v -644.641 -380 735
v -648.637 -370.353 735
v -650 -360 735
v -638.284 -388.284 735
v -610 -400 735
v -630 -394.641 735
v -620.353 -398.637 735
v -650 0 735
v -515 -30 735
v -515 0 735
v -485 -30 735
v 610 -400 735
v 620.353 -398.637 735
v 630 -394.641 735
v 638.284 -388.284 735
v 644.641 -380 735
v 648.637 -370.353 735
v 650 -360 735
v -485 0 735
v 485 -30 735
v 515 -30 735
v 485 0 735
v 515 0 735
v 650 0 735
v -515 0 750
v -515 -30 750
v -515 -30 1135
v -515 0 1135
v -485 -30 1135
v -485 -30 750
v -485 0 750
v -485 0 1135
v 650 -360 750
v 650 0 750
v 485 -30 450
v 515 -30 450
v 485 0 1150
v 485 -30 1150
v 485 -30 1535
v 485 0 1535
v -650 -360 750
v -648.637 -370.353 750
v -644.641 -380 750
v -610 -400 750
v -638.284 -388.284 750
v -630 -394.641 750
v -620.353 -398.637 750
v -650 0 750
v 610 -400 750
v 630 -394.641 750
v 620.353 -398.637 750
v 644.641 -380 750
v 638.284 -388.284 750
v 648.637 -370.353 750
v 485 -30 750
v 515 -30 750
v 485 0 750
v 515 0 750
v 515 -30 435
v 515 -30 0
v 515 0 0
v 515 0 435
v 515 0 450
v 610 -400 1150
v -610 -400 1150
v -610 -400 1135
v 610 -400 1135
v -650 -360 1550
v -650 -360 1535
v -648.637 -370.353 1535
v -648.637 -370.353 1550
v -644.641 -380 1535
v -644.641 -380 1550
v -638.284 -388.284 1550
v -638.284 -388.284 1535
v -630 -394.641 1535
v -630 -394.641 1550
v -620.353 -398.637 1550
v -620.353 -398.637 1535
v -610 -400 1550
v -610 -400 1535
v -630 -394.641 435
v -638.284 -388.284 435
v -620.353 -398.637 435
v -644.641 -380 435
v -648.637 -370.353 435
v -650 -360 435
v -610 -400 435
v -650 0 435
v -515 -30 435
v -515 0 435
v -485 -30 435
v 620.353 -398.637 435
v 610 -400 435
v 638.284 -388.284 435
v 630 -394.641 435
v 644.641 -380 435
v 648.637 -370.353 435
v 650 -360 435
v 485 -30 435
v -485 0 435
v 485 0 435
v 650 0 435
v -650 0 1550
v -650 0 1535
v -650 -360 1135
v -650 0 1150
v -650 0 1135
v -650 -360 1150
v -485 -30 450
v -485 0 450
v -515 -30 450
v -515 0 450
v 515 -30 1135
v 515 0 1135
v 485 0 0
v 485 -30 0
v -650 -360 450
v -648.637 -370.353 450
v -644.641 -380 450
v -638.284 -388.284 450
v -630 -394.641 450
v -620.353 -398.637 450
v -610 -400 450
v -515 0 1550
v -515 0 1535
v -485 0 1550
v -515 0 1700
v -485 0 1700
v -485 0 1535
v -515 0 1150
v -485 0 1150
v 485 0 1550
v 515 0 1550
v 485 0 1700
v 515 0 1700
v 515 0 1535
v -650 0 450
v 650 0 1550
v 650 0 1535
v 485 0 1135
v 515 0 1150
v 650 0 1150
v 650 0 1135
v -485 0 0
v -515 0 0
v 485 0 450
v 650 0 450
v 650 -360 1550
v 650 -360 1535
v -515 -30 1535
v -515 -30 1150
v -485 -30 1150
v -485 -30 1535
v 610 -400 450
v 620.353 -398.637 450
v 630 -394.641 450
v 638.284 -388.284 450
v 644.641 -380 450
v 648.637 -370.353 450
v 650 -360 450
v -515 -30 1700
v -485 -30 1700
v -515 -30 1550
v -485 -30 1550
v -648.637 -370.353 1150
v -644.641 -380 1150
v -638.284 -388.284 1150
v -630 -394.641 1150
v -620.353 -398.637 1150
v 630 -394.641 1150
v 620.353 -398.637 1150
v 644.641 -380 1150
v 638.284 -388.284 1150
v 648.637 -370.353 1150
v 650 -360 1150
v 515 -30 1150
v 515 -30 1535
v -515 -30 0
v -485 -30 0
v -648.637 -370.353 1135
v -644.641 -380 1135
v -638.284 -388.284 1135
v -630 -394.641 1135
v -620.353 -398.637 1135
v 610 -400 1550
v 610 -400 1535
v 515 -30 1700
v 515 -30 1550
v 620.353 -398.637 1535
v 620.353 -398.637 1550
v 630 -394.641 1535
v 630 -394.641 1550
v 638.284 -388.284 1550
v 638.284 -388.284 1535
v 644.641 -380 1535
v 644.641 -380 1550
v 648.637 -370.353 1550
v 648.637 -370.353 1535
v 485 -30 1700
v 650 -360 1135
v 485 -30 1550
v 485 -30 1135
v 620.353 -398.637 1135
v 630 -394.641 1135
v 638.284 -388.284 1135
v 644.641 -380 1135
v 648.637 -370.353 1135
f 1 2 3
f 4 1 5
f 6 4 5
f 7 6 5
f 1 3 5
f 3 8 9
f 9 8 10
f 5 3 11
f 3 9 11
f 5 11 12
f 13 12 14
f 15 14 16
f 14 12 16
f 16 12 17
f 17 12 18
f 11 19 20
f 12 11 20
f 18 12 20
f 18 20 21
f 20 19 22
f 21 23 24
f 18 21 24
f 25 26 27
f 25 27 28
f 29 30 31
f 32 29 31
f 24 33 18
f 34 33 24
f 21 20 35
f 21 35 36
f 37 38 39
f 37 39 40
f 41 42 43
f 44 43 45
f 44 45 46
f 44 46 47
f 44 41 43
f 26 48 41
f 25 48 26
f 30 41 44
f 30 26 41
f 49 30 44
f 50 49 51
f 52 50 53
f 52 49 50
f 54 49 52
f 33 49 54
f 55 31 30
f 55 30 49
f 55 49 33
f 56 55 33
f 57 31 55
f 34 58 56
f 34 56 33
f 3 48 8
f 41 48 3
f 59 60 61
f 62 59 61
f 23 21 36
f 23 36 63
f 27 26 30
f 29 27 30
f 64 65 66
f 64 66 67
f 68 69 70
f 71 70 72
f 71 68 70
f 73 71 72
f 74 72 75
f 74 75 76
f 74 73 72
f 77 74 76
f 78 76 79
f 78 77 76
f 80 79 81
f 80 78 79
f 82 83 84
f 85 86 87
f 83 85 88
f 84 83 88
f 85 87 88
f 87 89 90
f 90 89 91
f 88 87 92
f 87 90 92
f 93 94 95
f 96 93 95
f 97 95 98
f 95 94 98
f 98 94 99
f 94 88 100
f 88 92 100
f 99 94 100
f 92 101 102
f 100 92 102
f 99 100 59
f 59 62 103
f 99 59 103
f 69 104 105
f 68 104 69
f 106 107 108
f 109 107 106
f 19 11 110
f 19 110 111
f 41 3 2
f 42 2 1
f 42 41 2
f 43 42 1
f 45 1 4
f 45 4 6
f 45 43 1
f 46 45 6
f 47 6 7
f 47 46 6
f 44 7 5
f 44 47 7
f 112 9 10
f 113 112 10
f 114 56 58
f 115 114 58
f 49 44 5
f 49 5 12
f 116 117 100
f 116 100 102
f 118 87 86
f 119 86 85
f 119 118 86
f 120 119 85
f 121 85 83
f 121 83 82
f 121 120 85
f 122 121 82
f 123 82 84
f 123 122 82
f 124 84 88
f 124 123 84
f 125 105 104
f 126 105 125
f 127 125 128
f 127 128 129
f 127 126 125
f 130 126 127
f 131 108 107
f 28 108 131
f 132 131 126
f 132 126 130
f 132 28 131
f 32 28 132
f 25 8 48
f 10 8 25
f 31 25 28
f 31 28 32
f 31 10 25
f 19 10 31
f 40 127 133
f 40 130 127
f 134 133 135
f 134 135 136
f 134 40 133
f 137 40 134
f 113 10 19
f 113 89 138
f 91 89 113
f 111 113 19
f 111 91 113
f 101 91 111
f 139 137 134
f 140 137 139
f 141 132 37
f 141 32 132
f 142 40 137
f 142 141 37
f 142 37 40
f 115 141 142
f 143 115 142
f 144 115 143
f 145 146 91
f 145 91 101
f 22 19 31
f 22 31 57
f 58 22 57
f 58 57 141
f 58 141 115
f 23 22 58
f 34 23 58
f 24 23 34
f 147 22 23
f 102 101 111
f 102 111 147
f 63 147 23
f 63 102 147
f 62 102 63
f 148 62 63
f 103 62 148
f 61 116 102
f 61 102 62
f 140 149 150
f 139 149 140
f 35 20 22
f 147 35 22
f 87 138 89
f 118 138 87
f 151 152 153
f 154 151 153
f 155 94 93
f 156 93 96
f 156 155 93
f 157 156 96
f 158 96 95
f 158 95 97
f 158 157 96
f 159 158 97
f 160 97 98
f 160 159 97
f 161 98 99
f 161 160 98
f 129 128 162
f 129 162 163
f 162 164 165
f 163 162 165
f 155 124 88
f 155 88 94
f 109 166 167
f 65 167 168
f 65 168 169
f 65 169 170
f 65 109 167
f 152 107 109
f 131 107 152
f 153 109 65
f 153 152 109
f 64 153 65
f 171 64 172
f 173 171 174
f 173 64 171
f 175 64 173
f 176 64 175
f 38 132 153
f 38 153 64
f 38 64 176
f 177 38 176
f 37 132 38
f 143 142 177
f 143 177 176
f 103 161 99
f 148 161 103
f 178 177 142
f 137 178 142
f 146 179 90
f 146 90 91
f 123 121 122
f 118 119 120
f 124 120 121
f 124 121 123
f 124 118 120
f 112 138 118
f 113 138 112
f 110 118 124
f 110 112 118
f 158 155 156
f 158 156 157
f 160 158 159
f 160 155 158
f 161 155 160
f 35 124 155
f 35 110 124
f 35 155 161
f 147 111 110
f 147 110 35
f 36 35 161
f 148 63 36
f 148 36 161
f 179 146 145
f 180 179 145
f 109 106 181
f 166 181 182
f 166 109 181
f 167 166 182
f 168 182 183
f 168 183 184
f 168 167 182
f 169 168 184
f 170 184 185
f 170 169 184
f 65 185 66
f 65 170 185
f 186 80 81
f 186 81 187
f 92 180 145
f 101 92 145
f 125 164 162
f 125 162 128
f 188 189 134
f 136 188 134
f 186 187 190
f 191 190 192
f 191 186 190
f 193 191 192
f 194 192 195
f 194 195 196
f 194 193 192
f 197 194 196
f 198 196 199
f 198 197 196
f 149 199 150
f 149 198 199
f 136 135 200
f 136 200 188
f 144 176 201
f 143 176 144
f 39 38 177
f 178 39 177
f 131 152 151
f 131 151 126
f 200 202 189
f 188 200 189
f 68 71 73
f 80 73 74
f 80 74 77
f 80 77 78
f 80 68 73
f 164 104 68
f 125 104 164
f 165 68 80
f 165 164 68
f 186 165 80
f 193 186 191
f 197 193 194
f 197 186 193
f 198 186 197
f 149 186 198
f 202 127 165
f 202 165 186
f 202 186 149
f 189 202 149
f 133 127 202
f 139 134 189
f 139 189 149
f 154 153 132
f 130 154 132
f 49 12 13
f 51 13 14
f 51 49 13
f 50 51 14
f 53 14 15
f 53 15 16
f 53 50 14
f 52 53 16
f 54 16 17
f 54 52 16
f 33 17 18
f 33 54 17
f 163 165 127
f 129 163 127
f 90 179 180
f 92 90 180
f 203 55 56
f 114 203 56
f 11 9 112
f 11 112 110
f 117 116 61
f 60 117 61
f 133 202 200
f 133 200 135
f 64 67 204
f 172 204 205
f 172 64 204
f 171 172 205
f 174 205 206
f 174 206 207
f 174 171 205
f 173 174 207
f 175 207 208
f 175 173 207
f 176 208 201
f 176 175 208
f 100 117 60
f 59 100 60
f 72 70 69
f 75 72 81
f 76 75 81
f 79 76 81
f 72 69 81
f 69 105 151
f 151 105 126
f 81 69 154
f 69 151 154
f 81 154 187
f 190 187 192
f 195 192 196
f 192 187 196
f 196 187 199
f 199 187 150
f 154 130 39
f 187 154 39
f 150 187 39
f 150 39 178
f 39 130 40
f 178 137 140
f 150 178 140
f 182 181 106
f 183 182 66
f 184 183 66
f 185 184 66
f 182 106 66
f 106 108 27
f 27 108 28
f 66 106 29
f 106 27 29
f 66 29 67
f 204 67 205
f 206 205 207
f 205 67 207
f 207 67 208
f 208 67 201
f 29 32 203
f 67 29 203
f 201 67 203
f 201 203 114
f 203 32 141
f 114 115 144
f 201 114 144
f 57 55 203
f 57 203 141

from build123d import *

# Parameters (mm, degrees)
F7_W      = 30
F7_H      = 30
F8_DEPTH  = 1700
F15_DEPTH = 15
F17_DEPTH = 15
F19_DEPTH = 15
F21_DEPTH = 15


with BuildPart() as f8:
    # F7 (on Top) → F8 (new body)
    with BuildSketch(Plane.XY):
        with Locations((-500, -15)):
            Rectangle(F7_W, F7_H)
    extrude(amount=F8_DEPTH)



with BuildPart() as f8b:
    # F7 (on Top) → F8, piece 2 (new body)
    with BuildSketch(Plane.XY):
        with Locations((500, -15)):
            Rectangle(F7_W, F7_H)
    extrude(amount=F8_DEPTH)


with BuildPart() as f8_1:
    add(f8.part)

    add(f8b.part)  # F15 merges F8b
    # F14 (on offset) → F15 (join)
    with BuildSketch(Plane.XY.offset(450)):
        with BuildLine():
            Line((485, 0), (0, 0))
            Line((0, 0), (-485, 0))
            Line((-485, 0), (-485, -30))
            Line((-485, -30), (-515, -30))
            Line((-515, -30), (-515, 0))
            Line((-515, 0), (-650, 0))
            Line((-650, 0), (-650, -360))
            ThreePointArc((-650, -360), (-638.2842712475, -388.2842712475), (-610, -400))
            Line((-610, -400), (0, -400))
            Line((0, -400), (610, -400))
            ThreePointArc((610, -400), (638.2842712475, -388.2842712475), (650, -360))
            Line((650, -360), (650, 0))
            Line((650, 0), (515, 0))
            Line((515, 0), (515, -30))
            Line((515, -30), (485, -30))
            Line((485, -30), (485, 0))
        make_face()
    extrude(amount=-F15_DEPTH)

    # F16 (on offset) → F17 (join)
    with BuildSketch(Plane.XY.offset(750)):
        with BuildLine():
            Line((0, -400), (610, -400))
            ThreePointArc((610, -400), (638.2842712475, -388.2842712475), (650, -360))
            Line((650, -360), (650, 0))
            Line((650, 0), (515, 0))
            Line((515, 0), (515, -30))
            Line((515, -30), (485, -30))
            Line((485, -30), (485, 0))
            Line((485, 0), (0, 0))
            Line((0, 0), (-485, 0))
            Line((-485, 0), (-485, -30))
            Line((-485, -30), (-515, -30))
            Line((-515, -30), (-515, 0))
            Line((-515, 0), (-650, 0))
            Line((-650, 0), (-650, -360))
            ThreePointArc((-650, -360), (-638.2842712475, -388.2842712475), (-610, -400))
            Line((-610, -400), (0, -400))
        make_face()
    extrude(amount=-F17_DEPTH)

    # F18 (on offset) → F19 (join)
    with BuildSketch(Plane.XY.offset(1150)):
        with BuildLine():
            Line((0, -400), (610, -400))
            ThreePointArc((610, -400), (638.2842712475, -388.2842712475), (650, -360))
            Line((650, -360), (650, 0))
            Line((650, 0), (515, 0))
            Line((515, 0), (515, -30))
            Line((515, -30), (485, -30))
            Line((485, -30), (485, 0))
            Line((485, 0), (0, 0))
            Line((0, 0), (-485, 0))
            Line((-485, 0), (-485, -30))
            Line((-485, -30), (-515, -30))
            Line((-515, -30), (-515, 0))
            Line((-515, 0), (-650, 0))
            Line((-650, 0), (-650, -360))
            ThreePointArc((-650, -360), (-638.2842712475, -388.2842712475), (-610, -400))
            Line((-610, -400), (0, -400))
        make_face()
    extrude(amount=-F19_DEPTH)

    # F20 (on offset) → F21 (join)
    with BuildSketch(Plane.XY.offset(1550)):
        with BuildLine():
            Line((0, -400), (610, -400))
            ThreePointArc((610, -400), (638.2842712475, -388.2842712475), (650, -360))
            Line((650, -360), (650, 0))
            Line((650, 0), (515, 0))
            Line((515, 0), (515, -30))
            Line((515, -30), (485, -30))
            Line((485, -30), (485, 0))
            Line((485, 0), (0, 0))
            Line((0, 0), (-485, 0))
            Line((-485, 0), (-485, -30))
            Line((-485, -30), (-515, -30))
            Line((-515, -30), (-515, 0))
            Line((-515, 0), (-650, 0))
            Line((-650, 0), (-650, -360))
            ThreePointArc((-650, -360), (-638.2842712475, -388.2842712475), (-610, -400))
            Line((-610, -400), (0, -400))
        make_face()
    extrude(amount=-F21_DEPTH)


solid = f8_1.part
